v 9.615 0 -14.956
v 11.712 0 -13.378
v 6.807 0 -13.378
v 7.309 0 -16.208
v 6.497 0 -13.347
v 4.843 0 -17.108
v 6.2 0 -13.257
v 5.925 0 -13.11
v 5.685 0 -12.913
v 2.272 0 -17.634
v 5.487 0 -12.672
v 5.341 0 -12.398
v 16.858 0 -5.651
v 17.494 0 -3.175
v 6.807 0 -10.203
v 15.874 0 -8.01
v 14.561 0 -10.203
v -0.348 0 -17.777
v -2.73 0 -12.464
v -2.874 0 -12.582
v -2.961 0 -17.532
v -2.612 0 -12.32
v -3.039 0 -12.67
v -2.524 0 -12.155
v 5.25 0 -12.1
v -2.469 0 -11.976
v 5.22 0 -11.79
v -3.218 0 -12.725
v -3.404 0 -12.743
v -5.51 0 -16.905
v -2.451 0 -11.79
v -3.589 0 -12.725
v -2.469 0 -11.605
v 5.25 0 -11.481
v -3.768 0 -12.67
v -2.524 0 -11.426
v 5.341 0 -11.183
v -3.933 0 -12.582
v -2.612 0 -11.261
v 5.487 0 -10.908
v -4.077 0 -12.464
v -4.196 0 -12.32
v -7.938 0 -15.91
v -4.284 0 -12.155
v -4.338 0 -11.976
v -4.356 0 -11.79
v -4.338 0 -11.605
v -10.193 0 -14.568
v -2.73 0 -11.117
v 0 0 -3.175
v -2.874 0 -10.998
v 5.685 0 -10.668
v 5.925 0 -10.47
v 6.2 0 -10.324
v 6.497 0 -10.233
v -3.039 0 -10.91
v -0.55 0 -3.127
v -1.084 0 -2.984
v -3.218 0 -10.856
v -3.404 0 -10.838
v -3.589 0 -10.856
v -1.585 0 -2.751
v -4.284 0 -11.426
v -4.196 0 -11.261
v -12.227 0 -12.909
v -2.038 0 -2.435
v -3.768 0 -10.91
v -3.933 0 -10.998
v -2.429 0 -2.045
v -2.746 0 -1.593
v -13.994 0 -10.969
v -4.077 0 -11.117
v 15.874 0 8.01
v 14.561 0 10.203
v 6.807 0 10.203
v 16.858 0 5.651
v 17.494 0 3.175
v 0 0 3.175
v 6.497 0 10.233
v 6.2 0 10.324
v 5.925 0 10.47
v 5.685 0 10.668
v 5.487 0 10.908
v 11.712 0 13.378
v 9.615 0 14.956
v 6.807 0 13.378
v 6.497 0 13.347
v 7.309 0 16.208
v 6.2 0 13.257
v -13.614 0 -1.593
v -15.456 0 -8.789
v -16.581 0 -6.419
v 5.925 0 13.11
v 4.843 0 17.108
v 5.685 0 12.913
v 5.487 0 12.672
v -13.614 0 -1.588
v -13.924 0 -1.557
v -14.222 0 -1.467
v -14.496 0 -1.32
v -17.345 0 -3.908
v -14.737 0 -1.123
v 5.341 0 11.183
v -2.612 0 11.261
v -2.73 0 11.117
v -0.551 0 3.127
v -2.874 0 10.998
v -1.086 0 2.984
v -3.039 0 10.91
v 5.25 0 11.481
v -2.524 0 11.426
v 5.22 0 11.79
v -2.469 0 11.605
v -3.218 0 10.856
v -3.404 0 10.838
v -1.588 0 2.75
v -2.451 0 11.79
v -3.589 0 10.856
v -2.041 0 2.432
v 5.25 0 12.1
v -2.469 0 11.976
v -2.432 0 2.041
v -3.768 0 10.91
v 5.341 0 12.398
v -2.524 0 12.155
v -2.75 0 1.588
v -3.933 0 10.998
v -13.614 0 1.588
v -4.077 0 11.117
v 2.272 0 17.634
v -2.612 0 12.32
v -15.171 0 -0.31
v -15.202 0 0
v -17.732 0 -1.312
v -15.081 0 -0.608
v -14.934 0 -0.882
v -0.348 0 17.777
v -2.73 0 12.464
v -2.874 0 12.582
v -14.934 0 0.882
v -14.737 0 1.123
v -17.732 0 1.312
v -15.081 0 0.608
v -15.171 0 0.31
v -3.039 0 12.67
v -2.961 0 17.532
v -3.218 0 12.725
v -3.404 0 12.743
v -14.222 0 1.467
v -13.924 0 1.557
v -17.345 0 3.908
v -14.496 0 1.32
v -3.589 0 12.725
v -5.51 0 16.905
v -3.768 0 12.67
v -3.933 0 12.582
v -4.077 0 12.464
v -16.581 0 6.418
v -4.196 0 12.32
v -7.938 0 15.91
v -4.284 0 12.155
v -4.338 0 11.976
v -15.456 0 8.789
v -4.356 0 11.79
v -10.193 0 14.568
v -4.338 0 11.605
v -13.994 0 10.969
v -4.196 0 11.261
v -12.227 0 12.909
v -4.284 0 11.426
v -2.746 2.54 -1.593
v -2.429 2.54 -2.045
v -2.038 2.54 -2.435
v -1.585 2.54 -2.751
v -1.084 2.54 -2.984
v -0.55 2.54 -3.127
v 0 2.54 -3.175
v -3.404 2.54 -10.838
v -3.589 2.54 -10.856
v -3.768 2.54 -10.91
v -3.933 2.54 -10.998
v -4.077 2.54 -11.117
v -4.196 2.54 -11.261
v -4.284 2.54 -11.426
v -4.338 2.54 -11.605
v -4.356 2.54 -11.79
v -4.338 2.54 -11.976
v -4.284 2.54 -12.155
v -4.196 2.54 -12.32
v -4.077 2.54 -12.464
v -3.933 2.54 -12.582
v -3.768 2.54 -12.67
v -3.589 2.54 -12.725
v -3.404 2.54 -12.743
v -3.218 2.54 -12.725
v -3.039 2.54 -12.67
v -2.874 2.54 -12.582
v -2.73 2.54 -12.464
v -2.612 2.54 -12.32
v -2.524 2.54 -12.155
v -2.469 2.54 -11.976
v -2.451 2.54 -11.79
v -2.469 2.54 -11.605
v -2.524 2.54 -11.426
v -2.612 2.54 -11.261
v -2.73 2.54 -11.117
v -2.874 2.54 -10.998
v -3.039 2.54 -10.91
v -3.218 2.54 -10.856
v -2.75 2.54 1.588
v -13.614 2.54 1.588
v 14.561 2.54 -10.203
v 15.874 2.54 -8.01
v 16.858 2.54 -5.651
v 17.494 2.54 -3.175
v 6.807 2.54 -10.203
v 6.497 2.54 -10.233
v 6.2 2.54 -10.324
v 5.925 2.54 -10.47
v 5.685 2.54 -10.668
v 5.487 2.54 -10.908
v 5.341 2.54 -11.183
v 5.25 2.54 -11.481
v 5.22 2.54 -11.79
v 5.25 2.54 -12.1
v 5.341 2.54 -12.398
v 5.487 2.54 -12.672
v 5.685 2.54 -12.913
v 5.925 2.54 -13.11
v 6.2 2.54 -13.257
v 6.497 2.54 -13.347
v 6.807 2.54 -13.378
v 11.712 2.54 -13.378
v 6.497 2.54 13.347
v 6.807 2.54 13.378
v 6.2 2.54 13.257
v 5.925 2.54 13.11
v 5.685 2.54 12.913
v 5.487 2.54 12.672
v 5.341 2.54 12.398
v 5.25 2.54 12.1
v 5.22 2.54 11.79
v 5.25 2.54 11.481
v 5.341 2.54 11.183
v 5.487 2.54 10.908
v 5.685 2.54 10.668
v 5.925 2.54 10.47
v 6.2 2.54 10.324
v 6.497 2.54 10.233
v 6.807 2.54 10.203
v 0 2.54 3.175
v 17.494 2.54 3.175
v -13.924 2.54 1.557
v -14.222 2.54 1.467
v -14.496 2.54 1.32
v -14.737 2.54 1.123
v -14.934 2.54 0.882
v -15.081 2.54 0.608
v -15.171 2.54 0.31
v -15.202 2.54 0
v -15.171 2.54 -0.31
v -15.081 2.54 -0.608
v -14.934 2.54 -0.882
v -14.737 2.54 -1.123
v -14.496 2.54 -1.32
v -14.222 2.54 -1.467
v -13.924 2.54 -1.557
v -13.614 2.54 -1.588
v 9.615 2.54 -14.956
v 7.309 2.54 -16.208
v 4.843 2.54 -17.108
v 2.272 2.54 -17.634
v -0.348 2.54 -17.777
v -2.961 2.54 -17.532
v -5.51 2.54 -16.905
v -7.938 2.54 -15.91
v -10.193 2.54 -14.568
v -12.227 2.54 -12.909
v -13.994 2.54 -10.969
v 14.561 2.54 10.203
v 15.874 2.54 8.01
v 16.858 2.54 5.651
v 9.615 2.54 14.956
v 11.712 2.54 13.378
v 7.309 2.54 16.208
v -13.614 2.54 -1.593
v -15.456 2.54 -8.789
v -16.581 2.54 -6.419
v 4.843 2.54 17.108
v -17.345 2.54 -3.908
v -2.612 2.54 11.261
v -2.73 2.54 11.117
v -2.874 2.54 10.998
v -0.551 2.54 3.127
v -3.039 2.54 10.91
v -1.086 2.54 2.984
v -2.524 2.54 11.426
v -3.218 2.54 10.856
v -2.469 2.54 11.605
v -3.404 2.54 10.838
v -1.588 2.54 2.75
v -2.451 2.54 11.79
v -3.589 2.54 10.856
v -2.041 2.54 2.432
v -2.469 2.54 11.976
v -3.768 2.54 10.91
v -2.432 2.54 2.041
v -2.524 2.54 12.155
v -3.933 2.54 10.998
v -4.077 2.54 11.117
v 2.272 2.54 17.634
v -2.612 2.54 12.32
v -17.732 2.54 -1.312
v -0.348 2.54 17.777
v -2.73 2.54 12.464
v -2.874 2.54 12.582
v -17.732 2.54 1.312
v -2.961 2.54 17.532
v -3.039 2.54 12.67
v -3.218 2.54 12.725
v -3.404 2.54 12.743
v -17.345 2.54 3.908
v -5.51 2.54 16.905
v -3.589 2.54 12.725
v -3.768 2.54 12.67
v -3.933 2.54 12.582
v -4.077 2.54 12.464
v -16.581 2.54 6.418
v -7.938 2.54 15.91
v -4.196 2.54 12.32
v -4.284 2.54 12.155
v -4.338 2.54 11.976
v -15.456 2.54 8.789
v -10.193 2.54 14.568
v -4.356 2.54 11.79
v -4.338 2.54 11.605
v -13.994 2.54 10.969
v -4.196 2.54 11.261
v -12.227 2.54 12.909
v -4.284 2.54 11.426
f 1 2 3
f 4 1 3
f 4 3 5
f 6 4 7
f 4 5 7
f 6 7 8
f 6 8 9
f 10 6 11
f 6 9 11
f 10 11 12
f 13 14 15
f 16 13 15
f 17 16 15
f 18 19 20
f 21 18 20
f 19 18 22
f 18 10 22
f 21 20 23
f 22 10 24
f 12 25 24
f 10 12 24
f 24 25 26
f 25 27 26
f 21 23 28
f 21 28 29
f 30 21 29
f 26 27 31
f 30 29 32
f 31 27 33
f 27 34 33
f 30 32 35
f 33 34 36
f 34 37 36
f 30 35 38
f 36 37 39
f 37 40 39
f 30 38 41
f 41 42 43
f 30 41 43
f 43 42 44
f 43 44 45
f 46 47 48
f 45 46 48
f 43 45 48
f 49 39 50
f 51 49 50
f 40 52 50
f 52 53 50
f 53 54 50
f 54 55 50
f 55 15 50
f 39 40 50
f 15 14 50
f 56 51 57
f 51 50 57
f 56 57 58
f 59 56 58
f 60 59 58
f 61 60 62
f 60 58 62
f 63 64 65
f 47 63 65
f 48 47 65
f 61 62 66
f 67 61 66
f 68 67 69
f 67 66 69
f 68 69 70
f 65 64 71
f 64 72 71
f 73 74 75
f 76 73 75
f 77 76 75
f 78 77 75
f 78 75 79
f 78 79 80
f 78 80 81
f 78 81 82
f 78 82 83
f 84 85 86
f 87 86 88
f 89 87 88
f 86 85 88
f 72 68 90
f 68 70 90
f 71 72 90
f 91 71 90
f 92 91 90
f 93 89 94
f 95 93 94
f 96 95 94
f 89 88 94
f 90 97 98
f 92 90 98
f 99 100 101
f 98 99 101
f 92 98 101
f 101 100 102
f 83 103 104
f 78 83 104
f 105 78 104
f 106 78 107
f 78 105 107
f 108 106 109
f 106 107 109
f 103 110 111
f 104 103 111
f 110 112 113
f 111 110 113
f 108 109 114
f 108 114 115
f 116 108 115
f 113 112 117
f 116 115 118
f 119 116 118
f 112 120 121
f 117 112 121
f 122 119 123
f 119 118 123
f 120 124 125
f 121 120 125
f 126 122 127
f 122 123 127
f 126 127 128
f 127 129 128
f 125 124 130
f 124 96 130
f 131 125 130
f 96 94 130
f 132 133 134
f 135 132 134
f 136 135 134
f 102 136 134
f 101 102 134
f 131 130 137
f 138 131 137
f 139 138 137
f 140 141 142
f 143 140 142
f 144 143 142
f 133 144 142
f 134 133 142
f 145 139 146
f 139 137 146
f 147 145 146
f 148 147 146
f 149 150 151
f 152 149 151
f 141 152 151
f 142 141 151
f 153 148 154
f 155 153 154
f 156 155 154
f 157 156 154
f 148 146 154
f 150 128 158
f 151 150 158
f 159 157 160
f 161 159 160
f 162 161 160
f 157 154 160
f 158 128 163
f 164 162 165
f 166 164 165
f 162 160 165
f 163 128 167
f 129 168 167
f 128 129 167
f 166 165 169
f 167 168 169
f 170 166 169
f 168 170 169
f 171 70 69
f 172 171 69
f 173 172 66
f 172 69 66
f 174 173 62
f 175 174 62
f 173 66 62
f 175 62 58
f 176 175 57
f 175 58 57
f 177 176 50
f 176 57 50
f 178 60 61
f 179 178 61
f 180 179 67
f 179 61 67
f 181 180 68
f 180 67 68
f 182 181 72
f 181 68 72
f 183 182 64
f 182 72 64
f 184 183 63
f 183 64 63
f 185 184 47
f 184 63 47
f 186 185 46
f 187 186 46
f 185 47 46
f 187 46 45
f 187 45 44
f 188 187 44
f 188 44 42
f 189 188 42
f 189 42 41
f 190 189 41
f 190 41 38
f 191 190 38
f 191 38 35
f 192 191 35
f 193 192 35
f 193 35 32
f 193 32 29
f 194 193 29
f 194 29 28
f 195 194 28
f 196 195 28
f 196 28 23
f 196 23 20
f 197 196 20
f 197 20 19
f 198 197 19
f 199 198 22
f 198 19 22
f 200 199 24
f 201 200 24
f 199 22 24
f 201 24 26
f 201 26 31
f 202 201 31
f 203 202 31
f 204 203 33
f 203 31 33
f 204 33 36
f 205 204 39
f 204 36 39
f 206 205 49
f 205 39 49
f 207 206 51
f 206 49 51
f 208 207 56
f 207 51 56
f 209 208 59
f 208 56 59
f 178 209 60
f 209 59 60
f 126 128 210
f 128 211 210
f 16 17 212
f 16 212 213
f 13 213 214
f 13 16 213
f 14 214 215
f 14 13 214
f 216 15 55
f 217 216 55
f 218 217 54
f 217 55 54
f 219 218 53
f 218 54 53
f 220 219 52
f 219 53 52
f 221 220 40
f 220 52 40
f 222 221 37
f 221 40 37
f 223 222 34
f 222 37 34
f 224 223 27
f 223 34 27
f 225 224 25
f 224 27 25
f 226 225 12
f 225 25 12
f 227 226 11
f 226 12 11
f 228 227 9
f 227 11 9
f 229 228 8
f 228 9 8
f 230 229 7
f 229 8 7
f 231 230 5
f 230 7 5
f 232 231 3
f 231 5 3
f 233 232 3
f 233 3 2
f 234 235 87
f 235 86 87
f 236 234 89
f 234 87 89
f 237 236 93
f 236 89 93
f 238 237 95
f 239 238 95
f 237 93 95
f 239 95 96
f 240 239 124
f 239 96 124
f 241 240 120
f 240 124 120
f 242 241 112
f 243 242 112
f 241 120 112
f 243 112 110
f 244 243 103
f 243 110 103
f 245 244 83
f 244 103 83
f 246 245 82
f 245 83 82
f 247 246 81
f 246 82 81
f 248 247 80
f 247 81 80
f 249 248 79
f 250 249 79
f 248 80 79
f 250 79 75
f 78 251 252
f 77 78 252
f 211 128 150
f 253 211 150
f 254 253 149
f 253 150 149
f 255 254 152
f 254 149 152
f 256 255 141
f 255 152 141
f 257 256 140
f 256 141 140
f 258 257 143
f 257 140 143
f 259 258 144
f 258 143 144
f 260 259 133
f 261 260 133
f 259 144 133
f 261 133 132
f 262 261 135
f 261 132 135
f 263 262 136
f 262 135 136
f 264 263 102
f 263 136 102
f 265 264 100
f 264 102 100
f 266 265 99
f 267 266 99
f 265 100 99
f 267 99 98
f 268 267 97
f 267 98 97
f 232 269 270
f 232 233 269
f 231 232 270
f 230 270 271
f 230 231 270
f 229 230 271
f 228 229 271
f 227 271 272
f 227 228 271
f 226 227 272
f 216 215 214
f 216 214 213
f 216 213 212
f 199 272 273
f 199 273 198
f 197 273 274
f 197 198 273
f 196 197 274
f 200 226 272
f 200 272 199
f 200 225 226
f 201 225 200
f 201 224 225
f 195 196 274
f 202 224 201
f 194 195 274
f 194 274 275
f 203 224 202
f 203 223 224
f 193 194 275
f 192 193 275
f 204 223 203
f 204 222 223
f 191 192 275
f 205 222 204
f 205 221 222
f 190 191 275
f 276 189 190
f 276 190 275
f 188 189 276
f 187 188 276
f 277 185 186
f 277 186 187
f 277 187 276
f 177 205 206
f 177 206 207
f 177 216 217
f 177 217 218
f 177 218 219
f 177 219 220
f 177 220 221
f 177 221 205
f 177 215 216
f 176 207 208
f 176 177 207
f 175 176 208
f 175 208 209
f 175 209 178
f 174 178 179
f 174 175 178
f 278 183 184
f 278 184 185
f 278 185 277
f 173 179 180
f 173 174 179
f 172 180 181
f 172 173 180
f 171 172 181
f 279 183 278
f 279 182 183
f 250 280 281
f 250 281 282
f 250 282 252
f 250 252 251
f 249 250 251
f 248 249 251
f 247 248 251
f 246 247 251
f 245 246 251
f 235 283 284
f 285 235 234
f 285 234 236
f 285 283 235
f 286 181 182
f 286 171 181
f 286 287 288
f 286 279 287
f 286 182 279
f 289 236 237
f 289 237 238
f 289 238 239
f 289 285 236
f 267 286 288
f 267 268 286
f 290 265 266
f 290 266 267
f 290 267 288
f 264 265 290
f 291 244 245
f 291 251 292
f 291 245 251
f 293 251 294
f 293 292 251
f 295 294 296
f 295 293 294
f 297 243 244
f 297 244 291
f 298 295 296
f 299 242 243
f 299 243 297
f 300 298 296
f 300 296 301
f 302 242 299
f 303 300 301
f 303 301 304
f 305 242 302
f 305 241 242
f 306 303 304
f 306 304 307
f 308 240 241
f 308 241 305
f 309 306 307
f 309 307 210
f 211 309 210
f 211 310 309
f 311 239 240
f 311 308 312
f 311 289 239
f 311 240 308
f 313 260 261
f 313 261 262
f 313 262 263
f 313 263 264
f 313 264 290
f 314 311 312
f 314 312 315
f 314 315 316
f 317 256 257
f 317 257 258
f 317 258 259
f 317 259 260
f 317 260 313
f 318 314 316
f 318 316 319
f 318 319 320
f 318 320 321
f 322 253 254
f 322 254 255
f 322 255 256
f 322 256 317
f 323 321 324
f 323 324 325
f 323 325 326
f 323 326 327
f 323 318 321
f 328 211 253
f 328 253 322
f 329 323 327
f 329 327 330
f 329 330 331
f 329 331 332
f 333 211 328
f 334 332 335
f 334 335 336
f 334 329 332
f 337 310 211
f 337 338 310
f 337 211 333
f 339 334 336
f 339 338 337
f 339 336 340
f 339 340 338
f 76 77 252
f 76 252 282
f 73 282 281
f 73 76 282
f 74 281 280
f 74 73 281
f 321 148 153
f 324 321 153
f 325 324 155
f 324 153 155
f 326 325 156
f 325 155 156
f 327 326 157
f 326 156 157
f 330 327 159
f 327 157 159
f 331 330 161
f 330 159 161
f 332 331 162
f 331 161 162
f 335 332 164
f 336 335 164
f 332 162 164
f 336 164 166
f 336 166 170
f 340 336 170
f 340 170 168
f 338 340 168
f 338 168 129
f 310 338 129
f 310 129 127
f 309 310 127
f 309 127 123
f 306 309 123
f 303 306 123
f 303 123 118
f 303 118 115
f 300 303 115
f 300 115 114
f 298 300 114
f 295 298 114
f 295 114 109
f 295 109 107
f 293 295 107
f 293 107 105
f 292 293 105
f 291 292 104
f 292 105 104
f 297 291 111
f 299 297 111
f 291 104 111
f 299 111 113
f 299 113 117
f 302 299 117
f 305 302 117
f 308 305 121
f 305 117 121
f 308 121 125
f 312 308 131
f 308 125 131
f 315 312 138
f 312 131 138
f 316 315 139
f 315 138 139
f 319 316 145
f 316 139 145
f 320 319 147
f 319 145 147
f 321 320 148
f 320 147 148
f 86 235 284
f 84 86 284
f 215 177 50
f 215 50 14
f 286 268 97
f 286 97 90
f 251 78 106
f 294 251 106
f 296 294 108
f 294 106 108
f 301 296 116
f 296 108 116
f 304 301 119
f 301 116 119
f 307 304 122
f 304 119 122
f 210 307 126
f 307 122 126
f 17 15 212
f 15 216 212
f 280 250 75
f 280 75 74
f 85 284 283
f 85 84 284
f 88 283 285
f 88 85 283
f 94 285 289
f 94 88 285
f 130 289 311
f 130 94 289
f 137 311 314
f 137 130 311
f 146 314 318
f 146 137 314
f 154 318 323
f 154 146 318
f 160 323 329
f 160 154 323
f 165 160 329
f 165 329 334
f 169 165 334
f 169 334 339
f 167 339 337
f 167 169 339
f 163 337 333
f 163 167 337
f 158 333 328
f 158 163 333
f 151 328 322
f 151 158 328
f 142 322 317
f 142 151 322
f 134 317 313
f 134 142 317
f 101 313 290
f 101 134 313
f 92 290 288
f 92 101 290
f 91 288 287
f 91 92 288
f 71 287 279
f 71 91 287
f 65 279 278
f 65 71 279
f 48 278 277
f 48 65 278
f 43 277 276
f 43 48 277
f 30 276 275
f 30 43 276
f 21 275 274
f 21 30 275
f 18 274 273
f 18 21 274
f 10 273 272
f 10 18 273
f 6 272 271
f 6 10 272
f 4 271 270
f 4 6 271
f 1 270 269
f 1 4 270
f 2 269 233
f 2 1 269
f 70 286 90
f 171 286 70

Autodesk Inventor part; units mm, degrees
ref_plane "YZ Plane" through (0, 0, 0) normal (1, 0, 0) x (0, 1, 0)
ref_plane "XZ Plane" through (0, 0, 0) normal (0, 1, 0) x (-1, 0, 0)
ref_plane "XY Plane" through (0, 0, 0) normal (0, 0, 1) x (1, 0, 0)
sketch "Sketch1" plane through (0, 0, 0) normal (0, 1, 0) x (-1, 0, 0)
  circle A0 centre (0, 0) radius 17.78
  dimension "d0" = 35.56
extrude "Extrusion1" add sketch "Sketch1" along normal blind 2.54
sketch "Sketch2" plane through (0, 2.54, 0) normal (0, 1, 0) x (1, 0, 0)
  line L0 (0, 0) -> (-13.6144, 0)
  dimension "d3" = 13.6144
hole "Hole1" at (-13.6144, 2.54, 0) direction (0, -1, 0) diameter 3.175 end through all
pattern_circular "Circular Pattern1" count 3 over 360 about axis through (0, 0, 0) along (0, 1, 0) of "Hole1"
sketch "Sketch3" plane through (0, 2.54, 0) normal (0, 1, 0) x (1, 0, 0)
  circle A0 centre (6.8072, -11.7904) radius 1.5875 projected
  line L0 (6.8072, -13.3779) -> (11.9048, -13.3779)
  line L1 (6.8072, -10.2029) -> (15.3383, -10.2029)
  line L2 (15.3383, -10.2029) -> (11.7115, -13.3779)
  circle A1 centre (0, 0) radius 17.78 projected
  circle A2 centre (6.8072, 11.7904) radius 1.5875 projected
  line L3 (6.8072, 10.2029) -> (15.7862, 10.2029)
  line L4 (15.7862, 10.2029) -> (14.1062, 14.4538)
  line L5 (6.8072, 13.3779) -> (14.5314, 13.3779)
  line L6 (11.7115, -13.3779) -> (15.2969, -10.2391)
  circle A3 centre (0, 0) radius 17.78 projected
  point P0 (11.7115, 13.3779)
  point P1 (14.5612, 10.2029)
  point P2 (14.5612, -10.2029)
extrude "Extrusion2" cut sketch "Sketch3" against normal blind 2.54 contours A0 L1 A1 L0 | A1 L3 A2 L5
sketch "Sketch4" plane through (0, 2.54, 0) normal (0, 1, 0) x (1, 0, 0)
  circle A0 centre (0, 0) radius 3.175
  dimension "d16" = 6.35
hole "Hole2" at (0, 2.54, 0) direction (0, -1, 0) diameter 6.35 end through all
sketch "Sketch5" plane through (0, 2.54, 0) normal (0, 1, 0) x (1, 0, 0)
  circle A0 centre (-13.6144, 0) radius 1.5875 projected
  line L0 (-13.6144, -1.5875) -> (17.709, -1.5875)
  arc A1 (14.5612, -10.2029) -> (14.5612, 10.2029) centre (0, 0) ccw projected
  line L1 (-13.6144, -1.5875) -> (-13.6144, 0)
  line L2 (-13.6144, 0) -> (-13.6144, 1.5931)
  line L3 (-13.6144, 1.5931) -> (17.709, 1.5931)
  line L4 (17.709, 1.5931) -> (17.709, -1.5875)
  circle A2 centre (0, 0) radius 3.175 projected
  line L5 (0, 3.175) -> (17.709, 3.175)
  line L6 (0, -3.175) -> (17.4942, -3.175)
  line L7 (17.4942, -3.175) -> (17.709, -1.5875)
  line L8 (17.709, -1.5875) -> (17.709, 3.175)
  point P0 (17.4942, 3.175)
  point P1 (-2.7496, -1.5875)
  point P2 (-2.7464, 1.5931)
  point P3 (-13.6144, 1.5875)
extrude "Extrusion3" cut sketch "Sketch5" against normal blind 2.54 contours A0 L2 L3 A2 L0 | A2 L3 L4 L0 | L0 L7 L6 A2 | L4 A1 | A1 L7 | A2 L5 A1 L3
sketch "Sketch9" plane through (0, 2.54, 0) normal (0, 1, 0) x (1, 0, 0)
  arc A0 (-13.6144, 1.5875) -> (-13.6144, -1.5875) centre (-13.6144, 0) ccw projected
  arc A1 (6.8072, 13.3779) -> (6.8072, 10.2029) centre (6.8072, 11.7904) ccw projected
  line L0 (-13.6144, 0) -> (6.8072, 11.7904)
  arc A2 (6.8072, -10.2029) -> (6.8072, -13.3779) centre (6.8072, -11.7904) ccw projected
  line L1 (6.8072, 11.7904) -> (6.8072, -11.7904)
  line L2 (6.8072, -11.7904) -> (-13.6144, 0)
  line L3 (-13.6144, 0) -> (-13.6144, 11.7904)
  line L4 (-13.6144, 11.7904) -> (6.8072, 11.7904)
  line L5 (6.8072, -11.7904) -> (-13.6144, -11.7904)
  line L6 (-13.6144, -11.7904) -> (-13.6144, 0)
  circle A3 centre (-3.4036, 11.7904) radius 0.635
  circle A4 centre (-3.4036, -11.7904) radius 0.635
  point P0 (0, 0)
  dimension "d40" = 1.27
hole "Hole5" at (-3.4036, 2.54, -11.7904) at (-3.4036, 2.54, 11.7904) direction (0, -1, 0) diameter 1.905 end through all
properties part number "undertable" material "Stainless Steel AISI 304"
